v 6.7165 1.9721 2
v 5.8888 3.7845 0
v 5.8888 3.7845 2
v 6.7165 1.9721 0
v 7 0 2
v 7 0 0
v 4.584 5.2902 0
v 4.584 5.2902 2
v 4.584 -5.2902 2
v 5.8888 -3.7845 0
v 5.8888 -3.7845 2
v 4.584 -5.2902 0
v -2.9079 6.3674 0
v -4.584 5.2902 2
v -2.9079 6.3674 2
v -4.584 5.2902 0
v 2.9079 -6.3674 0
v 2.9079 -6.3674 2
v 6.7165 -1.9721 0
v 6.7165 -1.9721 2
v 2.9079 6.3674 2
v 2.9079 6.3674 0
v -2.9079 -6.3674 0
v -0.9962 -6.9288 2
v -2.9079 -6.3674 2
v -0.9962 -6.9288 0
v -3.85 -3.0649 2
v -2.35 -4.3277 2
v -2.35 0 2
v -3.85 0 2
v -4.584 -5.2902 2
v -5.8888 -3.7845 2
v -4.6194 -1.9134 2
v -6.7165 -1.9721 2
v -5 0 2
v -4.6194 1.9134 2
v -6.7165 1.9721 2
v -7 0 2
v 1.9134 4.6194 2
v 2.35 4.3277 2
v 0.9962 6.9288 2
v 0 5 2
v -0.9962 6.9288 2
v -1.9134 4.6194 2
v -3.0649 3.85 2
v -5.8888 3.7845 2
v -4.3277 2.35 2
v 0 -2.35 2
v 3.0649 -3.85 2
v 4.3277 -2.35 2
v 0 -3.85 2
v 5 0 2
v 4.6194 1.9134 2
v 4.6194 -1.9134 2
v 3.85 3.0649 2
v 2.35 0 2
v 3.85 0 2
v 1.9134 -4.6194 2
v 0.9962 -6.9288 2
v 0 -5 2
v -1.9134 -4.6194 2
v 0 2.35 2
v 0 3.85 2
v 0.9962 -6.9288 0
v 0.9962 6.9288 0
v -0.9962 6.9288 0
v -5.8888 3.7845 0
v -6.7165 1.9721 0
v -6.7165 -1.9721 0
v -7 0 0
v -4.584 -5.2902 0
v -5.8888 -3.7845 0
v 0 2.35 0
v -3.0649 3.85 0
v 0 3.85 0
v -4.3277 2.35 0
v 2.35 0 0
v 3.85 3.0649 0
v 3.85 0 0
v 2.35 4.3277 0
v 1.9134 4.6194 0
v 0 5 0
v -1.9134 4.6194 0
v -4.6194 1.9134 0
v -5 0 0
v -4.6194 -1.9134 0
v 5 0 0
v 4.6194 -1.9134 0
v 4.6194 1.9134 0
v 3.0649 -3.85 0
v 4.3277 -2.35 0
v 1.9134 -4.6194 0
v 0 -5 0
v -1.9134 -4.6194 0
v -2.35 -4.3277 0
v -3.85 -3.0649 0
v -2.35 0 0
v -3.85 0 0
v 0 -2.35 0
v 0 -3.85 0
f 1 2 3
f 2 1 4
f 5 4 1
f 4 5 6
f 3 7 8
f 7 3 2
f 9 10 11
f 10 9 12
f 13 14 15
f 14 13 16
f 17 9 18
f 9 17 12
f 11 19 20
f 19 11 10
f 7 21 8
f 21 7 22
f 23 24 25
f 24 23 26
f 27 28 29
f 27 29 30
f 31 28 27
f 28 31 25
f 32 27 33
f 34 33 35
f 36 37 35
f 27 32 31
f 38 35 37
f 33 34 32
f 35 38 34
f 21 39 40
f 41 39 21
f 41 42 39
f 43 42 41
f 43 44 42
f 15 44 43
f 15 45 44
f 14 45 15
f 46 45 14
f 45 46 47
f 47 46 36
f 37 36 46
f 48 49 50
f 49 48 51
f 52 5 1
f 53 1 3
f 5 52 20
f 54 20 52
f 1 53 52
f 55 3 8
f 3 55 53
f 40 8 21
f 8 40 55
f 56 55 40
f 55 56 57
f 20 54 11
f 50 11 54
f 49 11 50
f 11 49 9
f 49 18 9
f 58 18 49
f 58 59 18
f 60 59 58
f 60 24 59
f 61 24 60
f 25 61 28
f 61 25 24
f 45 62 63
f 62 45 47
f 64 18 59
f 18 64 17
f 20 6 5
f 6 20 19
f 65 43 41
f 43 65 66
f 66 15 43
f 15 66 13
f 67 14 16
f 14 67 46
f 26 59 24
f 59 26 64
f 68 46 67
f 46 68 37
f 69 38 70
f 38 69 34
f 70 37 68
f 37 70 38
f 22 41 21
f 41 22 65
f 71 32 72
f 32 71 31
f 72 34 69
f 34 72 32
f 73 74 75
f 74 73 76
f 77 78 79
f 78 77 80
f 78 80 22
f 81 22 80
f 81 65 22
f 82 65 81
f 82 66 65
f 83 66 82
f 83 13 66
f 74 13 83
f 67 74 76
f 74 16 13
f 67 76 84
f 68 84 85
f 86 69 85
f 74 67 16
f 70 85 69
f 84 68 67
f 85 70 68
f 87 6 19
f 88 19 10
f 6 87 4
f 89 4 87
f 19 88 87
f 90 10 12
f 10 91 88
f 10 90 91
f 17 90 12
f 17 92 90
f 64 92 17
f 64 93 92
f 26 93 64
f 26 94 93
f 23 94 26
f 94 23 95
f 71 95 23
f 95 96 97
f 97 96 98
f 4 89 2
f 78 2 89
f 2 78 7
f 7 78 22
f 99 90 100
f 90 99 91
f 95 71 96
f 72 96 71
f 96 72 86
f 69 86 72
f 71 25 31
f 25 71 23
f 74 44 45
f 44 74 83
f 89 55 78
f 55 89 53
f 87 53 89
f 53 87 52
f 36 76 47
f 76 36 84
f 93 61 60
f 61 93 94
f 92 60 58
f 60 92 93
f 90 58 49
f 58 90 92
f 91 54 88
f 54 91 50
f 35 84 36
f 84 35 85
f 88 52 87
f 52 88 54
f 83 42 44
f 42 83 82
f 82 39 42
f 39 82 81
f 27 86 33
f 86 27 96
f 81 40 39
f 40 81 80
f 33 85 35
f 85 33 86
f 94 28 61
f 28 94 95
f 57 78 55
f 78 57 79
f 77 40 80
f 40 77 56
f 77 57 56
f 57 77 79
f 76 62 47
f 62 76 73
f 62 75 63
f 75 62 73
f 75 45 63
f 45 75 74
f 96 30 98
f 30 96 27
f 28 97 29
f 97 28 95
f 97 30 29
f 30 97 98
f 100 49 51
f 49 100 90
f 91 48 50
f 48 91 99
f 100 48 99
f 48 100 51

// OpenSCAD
// file: ../libs/libdict.scad
// This library add dictionary like features to openscad
// the dictionary is a list of pairs as we cannot define new types.
// Unlike a python dictionary we cannot do a proper hash table for speed
// so everything is build around the OpenSCAD search function
// There are a lot of assert statements to ensure data in the "dictionary"
// is in the format of
// * A list of lists
// * Each internal list has a length of two
// * First element of each internal list is a string (the key)
// * All keys are unique.


// Private function:
// This function returns true if the value is in the list
// value must be a string.
// No error checking, for use by is_in only!
function _is_in_str(value, list) =
    search([value], list) != [[]];

// Private function:
// This function returns true if the value is in the list
// value must be a number.
// No error checking, for use by is_in only!
function _is_in_num(value, list) =
    search(value, list) != [];


// This function returns true if the value is in the list
// value must be a string or a number.
function is_in(value, list) =
    assert(is_num(value) || is_string(value) , "is_in: value must be a number or string")
    assert(is_list(list), "is_in: list must be a list")
    is_num(value) ? _is_in_num(value, list) : _is_in_str(value, list);

/**
 * Sum a list
 * This recursive function sums a list.  It should be called with one
 * argument (the list); the other two arguments simply allow it to be
 * "tail-recursive" which lets OpenSCAD optimise it better.  This is
 * very close to the example given in the OpenSCAD docs.
 */
function _libdict_sum_list(list, starting_element=0, running_total=0) =
    starting_element >= len(list) ?
        running_total :
        _libdict_sum_list(list, starting_element + 1, running_total + list[starting_element]);

/**
 * When checking a list for uniqueness, we can get "errant matches".
 * An errant match is when a non-list matches with the first element in a list.
 * i.e. it would consider [1, [1,0]] to be non-unique. We cannot know which 
 * element is the non-list but we do know that it is errant if exactly one 
 * of them is not a list.
 * If two elements are non-lists, they must be identical in order to have matched.  
 * Similarly, if all elements are lists, they must be identical because ``search`` 
 * will have matched them as whole lists.
 * The argument "list" is the list we are checking for uniqueness, and "match" is 
 * a vector of indices that have been returned by ``search``.
 */
function _check_errant_match(list, match) = let(
    non_list = [for (m = match) is_list(list[m])? 0 : 1],
    number_of_non_lists = _libdict_sum_list(non_list)
) number_of_non_lists == 1 ? 0 : 1;

// Returns true if all emements in list are unique.
function is_unique(list) =
    assert(is_list(list), "is_unique: list must be a list")
    let(
        matches = search(list, list, 0),
        // Assign 1 or 0 depending on is the match length for each element
        // return wether any matches are greater than one (mathcing more than
        // itself)
        // note cannot search for true or false so using 1 and zero
        bool_list = [for (match = matches) if (len(match)==1) 0
            // should put a 1 here to show they matched but in the case of
            // [1, [1]] it will match both, so need to check if they are
            // both lists or both not list
            else _check_errant_match(list, match)]
    ) !is_in(1, bool_list);

// Private function:
// Checks that the input is a list and that every element is a list
// of length 2.
// No error checking, for use by valid_dict only!
function _is_pairs(list) =
    !is_list(list) ? false :
        len(list)==0 ? false :
            !is_in(0, [for (pair = list) is_list(pair) && len(pair)==2 ? 1: 0]);

// Private function:
// Checks all elements in the list are strings
// No error checking, for use by valid_dict only!
// Strings can't be empty
function _is_list_of_strings(list) =
    !is_in(0, [for (item = list) is_string(item) && len(item)>0 ? 1: 0]);

// Private function:
// Returns the keus in a dictionary
// No error checking, for use by valid_dict only!
function _keylist(dict)  = [for (pair=dict) pair[0]];

function valid_dict(dict) =
    //if the input are not pairs return instantly
    !_is_pairs(dict) ? false : let (
        //if they are pairs get all keys
        keys = _keylist(dict),
        all_strings =  _is_list_of_strings(keys),
        unique = is_unique(keys)
    ) (all_strings && unique) ? true : false;

// Key lookup for key value pair "dictionary".
// Unlike the built in lookup this works with strings.
function key_lookup(key, dict) =
    assert(is_string(key), "`key` must be a string")
    assert(valid_dict(dict), "`dict` must be a valid 'dictionary'")
    let(
        // key is in [] because otherwise openscad will search for each letter rather than the string.
        index = search([key], dict, 1, 0)[0]
    )  assert (index!=[], "Key lookup failed, key not found!") dict[index][1];

// Creates a new dictionary with a key value pair replaced. Pair must already
// be in dictionary.
function replace_value(key, value, dict) =
    assert(is_string(key), "`key` must be a string")
    assert(valid_dict(dict), "`dict` must be a valid 'dictionary'")
    assert(is_in(key, _keylist(dict)), "`key` not found in dictionary!")
    [for (kv_pair = dict) key!=kv_pair[0] ? kv_pair : [key, value]];


// Creates a new dictionary with a a set of key value pair replaced
// both inputs must be a dictionary. All keys in input must already be
// in dictionary
function replace_multiple_values(rep_dict, dict) =
    assert(valid_dict(rep_dict), "`rep dict` must be a valid 'dictionary'")
    assert(valid_dict(dict), "`dict` must be a valid 'dictionary'")
    let(
        // loop over all keys in replacement dict checking they are in the original
        rep_keys = [for (key = _keylist(rep_dict))
            assert(is_in(key, _keylist(dict)), "`key` not found in dictionary!")
            key
        ]
    ) //Finally return the updated dictionary using this long list comprehension.
    [
        for (kv_pair = dict) let(
            key = kv_pair[0],
            // check if this key is in the replacement dictionary and if so return index
            // key is in [] because otherwise openscad will search for each letter rather
            // than the string.
            index = search([key], rep_dict, 1, 0)[0]
            // if index is empty return original key value pair, else return the key with
            // the replaced value
        ) index == [] ? kv_pair : [key, rep_dict[index][1]]
    ];
// main file
// this file just pulls out one module from picamera_2

use <../libs/cameras/picamera_2.scad>

picamera_2_lens_removal_tool();
